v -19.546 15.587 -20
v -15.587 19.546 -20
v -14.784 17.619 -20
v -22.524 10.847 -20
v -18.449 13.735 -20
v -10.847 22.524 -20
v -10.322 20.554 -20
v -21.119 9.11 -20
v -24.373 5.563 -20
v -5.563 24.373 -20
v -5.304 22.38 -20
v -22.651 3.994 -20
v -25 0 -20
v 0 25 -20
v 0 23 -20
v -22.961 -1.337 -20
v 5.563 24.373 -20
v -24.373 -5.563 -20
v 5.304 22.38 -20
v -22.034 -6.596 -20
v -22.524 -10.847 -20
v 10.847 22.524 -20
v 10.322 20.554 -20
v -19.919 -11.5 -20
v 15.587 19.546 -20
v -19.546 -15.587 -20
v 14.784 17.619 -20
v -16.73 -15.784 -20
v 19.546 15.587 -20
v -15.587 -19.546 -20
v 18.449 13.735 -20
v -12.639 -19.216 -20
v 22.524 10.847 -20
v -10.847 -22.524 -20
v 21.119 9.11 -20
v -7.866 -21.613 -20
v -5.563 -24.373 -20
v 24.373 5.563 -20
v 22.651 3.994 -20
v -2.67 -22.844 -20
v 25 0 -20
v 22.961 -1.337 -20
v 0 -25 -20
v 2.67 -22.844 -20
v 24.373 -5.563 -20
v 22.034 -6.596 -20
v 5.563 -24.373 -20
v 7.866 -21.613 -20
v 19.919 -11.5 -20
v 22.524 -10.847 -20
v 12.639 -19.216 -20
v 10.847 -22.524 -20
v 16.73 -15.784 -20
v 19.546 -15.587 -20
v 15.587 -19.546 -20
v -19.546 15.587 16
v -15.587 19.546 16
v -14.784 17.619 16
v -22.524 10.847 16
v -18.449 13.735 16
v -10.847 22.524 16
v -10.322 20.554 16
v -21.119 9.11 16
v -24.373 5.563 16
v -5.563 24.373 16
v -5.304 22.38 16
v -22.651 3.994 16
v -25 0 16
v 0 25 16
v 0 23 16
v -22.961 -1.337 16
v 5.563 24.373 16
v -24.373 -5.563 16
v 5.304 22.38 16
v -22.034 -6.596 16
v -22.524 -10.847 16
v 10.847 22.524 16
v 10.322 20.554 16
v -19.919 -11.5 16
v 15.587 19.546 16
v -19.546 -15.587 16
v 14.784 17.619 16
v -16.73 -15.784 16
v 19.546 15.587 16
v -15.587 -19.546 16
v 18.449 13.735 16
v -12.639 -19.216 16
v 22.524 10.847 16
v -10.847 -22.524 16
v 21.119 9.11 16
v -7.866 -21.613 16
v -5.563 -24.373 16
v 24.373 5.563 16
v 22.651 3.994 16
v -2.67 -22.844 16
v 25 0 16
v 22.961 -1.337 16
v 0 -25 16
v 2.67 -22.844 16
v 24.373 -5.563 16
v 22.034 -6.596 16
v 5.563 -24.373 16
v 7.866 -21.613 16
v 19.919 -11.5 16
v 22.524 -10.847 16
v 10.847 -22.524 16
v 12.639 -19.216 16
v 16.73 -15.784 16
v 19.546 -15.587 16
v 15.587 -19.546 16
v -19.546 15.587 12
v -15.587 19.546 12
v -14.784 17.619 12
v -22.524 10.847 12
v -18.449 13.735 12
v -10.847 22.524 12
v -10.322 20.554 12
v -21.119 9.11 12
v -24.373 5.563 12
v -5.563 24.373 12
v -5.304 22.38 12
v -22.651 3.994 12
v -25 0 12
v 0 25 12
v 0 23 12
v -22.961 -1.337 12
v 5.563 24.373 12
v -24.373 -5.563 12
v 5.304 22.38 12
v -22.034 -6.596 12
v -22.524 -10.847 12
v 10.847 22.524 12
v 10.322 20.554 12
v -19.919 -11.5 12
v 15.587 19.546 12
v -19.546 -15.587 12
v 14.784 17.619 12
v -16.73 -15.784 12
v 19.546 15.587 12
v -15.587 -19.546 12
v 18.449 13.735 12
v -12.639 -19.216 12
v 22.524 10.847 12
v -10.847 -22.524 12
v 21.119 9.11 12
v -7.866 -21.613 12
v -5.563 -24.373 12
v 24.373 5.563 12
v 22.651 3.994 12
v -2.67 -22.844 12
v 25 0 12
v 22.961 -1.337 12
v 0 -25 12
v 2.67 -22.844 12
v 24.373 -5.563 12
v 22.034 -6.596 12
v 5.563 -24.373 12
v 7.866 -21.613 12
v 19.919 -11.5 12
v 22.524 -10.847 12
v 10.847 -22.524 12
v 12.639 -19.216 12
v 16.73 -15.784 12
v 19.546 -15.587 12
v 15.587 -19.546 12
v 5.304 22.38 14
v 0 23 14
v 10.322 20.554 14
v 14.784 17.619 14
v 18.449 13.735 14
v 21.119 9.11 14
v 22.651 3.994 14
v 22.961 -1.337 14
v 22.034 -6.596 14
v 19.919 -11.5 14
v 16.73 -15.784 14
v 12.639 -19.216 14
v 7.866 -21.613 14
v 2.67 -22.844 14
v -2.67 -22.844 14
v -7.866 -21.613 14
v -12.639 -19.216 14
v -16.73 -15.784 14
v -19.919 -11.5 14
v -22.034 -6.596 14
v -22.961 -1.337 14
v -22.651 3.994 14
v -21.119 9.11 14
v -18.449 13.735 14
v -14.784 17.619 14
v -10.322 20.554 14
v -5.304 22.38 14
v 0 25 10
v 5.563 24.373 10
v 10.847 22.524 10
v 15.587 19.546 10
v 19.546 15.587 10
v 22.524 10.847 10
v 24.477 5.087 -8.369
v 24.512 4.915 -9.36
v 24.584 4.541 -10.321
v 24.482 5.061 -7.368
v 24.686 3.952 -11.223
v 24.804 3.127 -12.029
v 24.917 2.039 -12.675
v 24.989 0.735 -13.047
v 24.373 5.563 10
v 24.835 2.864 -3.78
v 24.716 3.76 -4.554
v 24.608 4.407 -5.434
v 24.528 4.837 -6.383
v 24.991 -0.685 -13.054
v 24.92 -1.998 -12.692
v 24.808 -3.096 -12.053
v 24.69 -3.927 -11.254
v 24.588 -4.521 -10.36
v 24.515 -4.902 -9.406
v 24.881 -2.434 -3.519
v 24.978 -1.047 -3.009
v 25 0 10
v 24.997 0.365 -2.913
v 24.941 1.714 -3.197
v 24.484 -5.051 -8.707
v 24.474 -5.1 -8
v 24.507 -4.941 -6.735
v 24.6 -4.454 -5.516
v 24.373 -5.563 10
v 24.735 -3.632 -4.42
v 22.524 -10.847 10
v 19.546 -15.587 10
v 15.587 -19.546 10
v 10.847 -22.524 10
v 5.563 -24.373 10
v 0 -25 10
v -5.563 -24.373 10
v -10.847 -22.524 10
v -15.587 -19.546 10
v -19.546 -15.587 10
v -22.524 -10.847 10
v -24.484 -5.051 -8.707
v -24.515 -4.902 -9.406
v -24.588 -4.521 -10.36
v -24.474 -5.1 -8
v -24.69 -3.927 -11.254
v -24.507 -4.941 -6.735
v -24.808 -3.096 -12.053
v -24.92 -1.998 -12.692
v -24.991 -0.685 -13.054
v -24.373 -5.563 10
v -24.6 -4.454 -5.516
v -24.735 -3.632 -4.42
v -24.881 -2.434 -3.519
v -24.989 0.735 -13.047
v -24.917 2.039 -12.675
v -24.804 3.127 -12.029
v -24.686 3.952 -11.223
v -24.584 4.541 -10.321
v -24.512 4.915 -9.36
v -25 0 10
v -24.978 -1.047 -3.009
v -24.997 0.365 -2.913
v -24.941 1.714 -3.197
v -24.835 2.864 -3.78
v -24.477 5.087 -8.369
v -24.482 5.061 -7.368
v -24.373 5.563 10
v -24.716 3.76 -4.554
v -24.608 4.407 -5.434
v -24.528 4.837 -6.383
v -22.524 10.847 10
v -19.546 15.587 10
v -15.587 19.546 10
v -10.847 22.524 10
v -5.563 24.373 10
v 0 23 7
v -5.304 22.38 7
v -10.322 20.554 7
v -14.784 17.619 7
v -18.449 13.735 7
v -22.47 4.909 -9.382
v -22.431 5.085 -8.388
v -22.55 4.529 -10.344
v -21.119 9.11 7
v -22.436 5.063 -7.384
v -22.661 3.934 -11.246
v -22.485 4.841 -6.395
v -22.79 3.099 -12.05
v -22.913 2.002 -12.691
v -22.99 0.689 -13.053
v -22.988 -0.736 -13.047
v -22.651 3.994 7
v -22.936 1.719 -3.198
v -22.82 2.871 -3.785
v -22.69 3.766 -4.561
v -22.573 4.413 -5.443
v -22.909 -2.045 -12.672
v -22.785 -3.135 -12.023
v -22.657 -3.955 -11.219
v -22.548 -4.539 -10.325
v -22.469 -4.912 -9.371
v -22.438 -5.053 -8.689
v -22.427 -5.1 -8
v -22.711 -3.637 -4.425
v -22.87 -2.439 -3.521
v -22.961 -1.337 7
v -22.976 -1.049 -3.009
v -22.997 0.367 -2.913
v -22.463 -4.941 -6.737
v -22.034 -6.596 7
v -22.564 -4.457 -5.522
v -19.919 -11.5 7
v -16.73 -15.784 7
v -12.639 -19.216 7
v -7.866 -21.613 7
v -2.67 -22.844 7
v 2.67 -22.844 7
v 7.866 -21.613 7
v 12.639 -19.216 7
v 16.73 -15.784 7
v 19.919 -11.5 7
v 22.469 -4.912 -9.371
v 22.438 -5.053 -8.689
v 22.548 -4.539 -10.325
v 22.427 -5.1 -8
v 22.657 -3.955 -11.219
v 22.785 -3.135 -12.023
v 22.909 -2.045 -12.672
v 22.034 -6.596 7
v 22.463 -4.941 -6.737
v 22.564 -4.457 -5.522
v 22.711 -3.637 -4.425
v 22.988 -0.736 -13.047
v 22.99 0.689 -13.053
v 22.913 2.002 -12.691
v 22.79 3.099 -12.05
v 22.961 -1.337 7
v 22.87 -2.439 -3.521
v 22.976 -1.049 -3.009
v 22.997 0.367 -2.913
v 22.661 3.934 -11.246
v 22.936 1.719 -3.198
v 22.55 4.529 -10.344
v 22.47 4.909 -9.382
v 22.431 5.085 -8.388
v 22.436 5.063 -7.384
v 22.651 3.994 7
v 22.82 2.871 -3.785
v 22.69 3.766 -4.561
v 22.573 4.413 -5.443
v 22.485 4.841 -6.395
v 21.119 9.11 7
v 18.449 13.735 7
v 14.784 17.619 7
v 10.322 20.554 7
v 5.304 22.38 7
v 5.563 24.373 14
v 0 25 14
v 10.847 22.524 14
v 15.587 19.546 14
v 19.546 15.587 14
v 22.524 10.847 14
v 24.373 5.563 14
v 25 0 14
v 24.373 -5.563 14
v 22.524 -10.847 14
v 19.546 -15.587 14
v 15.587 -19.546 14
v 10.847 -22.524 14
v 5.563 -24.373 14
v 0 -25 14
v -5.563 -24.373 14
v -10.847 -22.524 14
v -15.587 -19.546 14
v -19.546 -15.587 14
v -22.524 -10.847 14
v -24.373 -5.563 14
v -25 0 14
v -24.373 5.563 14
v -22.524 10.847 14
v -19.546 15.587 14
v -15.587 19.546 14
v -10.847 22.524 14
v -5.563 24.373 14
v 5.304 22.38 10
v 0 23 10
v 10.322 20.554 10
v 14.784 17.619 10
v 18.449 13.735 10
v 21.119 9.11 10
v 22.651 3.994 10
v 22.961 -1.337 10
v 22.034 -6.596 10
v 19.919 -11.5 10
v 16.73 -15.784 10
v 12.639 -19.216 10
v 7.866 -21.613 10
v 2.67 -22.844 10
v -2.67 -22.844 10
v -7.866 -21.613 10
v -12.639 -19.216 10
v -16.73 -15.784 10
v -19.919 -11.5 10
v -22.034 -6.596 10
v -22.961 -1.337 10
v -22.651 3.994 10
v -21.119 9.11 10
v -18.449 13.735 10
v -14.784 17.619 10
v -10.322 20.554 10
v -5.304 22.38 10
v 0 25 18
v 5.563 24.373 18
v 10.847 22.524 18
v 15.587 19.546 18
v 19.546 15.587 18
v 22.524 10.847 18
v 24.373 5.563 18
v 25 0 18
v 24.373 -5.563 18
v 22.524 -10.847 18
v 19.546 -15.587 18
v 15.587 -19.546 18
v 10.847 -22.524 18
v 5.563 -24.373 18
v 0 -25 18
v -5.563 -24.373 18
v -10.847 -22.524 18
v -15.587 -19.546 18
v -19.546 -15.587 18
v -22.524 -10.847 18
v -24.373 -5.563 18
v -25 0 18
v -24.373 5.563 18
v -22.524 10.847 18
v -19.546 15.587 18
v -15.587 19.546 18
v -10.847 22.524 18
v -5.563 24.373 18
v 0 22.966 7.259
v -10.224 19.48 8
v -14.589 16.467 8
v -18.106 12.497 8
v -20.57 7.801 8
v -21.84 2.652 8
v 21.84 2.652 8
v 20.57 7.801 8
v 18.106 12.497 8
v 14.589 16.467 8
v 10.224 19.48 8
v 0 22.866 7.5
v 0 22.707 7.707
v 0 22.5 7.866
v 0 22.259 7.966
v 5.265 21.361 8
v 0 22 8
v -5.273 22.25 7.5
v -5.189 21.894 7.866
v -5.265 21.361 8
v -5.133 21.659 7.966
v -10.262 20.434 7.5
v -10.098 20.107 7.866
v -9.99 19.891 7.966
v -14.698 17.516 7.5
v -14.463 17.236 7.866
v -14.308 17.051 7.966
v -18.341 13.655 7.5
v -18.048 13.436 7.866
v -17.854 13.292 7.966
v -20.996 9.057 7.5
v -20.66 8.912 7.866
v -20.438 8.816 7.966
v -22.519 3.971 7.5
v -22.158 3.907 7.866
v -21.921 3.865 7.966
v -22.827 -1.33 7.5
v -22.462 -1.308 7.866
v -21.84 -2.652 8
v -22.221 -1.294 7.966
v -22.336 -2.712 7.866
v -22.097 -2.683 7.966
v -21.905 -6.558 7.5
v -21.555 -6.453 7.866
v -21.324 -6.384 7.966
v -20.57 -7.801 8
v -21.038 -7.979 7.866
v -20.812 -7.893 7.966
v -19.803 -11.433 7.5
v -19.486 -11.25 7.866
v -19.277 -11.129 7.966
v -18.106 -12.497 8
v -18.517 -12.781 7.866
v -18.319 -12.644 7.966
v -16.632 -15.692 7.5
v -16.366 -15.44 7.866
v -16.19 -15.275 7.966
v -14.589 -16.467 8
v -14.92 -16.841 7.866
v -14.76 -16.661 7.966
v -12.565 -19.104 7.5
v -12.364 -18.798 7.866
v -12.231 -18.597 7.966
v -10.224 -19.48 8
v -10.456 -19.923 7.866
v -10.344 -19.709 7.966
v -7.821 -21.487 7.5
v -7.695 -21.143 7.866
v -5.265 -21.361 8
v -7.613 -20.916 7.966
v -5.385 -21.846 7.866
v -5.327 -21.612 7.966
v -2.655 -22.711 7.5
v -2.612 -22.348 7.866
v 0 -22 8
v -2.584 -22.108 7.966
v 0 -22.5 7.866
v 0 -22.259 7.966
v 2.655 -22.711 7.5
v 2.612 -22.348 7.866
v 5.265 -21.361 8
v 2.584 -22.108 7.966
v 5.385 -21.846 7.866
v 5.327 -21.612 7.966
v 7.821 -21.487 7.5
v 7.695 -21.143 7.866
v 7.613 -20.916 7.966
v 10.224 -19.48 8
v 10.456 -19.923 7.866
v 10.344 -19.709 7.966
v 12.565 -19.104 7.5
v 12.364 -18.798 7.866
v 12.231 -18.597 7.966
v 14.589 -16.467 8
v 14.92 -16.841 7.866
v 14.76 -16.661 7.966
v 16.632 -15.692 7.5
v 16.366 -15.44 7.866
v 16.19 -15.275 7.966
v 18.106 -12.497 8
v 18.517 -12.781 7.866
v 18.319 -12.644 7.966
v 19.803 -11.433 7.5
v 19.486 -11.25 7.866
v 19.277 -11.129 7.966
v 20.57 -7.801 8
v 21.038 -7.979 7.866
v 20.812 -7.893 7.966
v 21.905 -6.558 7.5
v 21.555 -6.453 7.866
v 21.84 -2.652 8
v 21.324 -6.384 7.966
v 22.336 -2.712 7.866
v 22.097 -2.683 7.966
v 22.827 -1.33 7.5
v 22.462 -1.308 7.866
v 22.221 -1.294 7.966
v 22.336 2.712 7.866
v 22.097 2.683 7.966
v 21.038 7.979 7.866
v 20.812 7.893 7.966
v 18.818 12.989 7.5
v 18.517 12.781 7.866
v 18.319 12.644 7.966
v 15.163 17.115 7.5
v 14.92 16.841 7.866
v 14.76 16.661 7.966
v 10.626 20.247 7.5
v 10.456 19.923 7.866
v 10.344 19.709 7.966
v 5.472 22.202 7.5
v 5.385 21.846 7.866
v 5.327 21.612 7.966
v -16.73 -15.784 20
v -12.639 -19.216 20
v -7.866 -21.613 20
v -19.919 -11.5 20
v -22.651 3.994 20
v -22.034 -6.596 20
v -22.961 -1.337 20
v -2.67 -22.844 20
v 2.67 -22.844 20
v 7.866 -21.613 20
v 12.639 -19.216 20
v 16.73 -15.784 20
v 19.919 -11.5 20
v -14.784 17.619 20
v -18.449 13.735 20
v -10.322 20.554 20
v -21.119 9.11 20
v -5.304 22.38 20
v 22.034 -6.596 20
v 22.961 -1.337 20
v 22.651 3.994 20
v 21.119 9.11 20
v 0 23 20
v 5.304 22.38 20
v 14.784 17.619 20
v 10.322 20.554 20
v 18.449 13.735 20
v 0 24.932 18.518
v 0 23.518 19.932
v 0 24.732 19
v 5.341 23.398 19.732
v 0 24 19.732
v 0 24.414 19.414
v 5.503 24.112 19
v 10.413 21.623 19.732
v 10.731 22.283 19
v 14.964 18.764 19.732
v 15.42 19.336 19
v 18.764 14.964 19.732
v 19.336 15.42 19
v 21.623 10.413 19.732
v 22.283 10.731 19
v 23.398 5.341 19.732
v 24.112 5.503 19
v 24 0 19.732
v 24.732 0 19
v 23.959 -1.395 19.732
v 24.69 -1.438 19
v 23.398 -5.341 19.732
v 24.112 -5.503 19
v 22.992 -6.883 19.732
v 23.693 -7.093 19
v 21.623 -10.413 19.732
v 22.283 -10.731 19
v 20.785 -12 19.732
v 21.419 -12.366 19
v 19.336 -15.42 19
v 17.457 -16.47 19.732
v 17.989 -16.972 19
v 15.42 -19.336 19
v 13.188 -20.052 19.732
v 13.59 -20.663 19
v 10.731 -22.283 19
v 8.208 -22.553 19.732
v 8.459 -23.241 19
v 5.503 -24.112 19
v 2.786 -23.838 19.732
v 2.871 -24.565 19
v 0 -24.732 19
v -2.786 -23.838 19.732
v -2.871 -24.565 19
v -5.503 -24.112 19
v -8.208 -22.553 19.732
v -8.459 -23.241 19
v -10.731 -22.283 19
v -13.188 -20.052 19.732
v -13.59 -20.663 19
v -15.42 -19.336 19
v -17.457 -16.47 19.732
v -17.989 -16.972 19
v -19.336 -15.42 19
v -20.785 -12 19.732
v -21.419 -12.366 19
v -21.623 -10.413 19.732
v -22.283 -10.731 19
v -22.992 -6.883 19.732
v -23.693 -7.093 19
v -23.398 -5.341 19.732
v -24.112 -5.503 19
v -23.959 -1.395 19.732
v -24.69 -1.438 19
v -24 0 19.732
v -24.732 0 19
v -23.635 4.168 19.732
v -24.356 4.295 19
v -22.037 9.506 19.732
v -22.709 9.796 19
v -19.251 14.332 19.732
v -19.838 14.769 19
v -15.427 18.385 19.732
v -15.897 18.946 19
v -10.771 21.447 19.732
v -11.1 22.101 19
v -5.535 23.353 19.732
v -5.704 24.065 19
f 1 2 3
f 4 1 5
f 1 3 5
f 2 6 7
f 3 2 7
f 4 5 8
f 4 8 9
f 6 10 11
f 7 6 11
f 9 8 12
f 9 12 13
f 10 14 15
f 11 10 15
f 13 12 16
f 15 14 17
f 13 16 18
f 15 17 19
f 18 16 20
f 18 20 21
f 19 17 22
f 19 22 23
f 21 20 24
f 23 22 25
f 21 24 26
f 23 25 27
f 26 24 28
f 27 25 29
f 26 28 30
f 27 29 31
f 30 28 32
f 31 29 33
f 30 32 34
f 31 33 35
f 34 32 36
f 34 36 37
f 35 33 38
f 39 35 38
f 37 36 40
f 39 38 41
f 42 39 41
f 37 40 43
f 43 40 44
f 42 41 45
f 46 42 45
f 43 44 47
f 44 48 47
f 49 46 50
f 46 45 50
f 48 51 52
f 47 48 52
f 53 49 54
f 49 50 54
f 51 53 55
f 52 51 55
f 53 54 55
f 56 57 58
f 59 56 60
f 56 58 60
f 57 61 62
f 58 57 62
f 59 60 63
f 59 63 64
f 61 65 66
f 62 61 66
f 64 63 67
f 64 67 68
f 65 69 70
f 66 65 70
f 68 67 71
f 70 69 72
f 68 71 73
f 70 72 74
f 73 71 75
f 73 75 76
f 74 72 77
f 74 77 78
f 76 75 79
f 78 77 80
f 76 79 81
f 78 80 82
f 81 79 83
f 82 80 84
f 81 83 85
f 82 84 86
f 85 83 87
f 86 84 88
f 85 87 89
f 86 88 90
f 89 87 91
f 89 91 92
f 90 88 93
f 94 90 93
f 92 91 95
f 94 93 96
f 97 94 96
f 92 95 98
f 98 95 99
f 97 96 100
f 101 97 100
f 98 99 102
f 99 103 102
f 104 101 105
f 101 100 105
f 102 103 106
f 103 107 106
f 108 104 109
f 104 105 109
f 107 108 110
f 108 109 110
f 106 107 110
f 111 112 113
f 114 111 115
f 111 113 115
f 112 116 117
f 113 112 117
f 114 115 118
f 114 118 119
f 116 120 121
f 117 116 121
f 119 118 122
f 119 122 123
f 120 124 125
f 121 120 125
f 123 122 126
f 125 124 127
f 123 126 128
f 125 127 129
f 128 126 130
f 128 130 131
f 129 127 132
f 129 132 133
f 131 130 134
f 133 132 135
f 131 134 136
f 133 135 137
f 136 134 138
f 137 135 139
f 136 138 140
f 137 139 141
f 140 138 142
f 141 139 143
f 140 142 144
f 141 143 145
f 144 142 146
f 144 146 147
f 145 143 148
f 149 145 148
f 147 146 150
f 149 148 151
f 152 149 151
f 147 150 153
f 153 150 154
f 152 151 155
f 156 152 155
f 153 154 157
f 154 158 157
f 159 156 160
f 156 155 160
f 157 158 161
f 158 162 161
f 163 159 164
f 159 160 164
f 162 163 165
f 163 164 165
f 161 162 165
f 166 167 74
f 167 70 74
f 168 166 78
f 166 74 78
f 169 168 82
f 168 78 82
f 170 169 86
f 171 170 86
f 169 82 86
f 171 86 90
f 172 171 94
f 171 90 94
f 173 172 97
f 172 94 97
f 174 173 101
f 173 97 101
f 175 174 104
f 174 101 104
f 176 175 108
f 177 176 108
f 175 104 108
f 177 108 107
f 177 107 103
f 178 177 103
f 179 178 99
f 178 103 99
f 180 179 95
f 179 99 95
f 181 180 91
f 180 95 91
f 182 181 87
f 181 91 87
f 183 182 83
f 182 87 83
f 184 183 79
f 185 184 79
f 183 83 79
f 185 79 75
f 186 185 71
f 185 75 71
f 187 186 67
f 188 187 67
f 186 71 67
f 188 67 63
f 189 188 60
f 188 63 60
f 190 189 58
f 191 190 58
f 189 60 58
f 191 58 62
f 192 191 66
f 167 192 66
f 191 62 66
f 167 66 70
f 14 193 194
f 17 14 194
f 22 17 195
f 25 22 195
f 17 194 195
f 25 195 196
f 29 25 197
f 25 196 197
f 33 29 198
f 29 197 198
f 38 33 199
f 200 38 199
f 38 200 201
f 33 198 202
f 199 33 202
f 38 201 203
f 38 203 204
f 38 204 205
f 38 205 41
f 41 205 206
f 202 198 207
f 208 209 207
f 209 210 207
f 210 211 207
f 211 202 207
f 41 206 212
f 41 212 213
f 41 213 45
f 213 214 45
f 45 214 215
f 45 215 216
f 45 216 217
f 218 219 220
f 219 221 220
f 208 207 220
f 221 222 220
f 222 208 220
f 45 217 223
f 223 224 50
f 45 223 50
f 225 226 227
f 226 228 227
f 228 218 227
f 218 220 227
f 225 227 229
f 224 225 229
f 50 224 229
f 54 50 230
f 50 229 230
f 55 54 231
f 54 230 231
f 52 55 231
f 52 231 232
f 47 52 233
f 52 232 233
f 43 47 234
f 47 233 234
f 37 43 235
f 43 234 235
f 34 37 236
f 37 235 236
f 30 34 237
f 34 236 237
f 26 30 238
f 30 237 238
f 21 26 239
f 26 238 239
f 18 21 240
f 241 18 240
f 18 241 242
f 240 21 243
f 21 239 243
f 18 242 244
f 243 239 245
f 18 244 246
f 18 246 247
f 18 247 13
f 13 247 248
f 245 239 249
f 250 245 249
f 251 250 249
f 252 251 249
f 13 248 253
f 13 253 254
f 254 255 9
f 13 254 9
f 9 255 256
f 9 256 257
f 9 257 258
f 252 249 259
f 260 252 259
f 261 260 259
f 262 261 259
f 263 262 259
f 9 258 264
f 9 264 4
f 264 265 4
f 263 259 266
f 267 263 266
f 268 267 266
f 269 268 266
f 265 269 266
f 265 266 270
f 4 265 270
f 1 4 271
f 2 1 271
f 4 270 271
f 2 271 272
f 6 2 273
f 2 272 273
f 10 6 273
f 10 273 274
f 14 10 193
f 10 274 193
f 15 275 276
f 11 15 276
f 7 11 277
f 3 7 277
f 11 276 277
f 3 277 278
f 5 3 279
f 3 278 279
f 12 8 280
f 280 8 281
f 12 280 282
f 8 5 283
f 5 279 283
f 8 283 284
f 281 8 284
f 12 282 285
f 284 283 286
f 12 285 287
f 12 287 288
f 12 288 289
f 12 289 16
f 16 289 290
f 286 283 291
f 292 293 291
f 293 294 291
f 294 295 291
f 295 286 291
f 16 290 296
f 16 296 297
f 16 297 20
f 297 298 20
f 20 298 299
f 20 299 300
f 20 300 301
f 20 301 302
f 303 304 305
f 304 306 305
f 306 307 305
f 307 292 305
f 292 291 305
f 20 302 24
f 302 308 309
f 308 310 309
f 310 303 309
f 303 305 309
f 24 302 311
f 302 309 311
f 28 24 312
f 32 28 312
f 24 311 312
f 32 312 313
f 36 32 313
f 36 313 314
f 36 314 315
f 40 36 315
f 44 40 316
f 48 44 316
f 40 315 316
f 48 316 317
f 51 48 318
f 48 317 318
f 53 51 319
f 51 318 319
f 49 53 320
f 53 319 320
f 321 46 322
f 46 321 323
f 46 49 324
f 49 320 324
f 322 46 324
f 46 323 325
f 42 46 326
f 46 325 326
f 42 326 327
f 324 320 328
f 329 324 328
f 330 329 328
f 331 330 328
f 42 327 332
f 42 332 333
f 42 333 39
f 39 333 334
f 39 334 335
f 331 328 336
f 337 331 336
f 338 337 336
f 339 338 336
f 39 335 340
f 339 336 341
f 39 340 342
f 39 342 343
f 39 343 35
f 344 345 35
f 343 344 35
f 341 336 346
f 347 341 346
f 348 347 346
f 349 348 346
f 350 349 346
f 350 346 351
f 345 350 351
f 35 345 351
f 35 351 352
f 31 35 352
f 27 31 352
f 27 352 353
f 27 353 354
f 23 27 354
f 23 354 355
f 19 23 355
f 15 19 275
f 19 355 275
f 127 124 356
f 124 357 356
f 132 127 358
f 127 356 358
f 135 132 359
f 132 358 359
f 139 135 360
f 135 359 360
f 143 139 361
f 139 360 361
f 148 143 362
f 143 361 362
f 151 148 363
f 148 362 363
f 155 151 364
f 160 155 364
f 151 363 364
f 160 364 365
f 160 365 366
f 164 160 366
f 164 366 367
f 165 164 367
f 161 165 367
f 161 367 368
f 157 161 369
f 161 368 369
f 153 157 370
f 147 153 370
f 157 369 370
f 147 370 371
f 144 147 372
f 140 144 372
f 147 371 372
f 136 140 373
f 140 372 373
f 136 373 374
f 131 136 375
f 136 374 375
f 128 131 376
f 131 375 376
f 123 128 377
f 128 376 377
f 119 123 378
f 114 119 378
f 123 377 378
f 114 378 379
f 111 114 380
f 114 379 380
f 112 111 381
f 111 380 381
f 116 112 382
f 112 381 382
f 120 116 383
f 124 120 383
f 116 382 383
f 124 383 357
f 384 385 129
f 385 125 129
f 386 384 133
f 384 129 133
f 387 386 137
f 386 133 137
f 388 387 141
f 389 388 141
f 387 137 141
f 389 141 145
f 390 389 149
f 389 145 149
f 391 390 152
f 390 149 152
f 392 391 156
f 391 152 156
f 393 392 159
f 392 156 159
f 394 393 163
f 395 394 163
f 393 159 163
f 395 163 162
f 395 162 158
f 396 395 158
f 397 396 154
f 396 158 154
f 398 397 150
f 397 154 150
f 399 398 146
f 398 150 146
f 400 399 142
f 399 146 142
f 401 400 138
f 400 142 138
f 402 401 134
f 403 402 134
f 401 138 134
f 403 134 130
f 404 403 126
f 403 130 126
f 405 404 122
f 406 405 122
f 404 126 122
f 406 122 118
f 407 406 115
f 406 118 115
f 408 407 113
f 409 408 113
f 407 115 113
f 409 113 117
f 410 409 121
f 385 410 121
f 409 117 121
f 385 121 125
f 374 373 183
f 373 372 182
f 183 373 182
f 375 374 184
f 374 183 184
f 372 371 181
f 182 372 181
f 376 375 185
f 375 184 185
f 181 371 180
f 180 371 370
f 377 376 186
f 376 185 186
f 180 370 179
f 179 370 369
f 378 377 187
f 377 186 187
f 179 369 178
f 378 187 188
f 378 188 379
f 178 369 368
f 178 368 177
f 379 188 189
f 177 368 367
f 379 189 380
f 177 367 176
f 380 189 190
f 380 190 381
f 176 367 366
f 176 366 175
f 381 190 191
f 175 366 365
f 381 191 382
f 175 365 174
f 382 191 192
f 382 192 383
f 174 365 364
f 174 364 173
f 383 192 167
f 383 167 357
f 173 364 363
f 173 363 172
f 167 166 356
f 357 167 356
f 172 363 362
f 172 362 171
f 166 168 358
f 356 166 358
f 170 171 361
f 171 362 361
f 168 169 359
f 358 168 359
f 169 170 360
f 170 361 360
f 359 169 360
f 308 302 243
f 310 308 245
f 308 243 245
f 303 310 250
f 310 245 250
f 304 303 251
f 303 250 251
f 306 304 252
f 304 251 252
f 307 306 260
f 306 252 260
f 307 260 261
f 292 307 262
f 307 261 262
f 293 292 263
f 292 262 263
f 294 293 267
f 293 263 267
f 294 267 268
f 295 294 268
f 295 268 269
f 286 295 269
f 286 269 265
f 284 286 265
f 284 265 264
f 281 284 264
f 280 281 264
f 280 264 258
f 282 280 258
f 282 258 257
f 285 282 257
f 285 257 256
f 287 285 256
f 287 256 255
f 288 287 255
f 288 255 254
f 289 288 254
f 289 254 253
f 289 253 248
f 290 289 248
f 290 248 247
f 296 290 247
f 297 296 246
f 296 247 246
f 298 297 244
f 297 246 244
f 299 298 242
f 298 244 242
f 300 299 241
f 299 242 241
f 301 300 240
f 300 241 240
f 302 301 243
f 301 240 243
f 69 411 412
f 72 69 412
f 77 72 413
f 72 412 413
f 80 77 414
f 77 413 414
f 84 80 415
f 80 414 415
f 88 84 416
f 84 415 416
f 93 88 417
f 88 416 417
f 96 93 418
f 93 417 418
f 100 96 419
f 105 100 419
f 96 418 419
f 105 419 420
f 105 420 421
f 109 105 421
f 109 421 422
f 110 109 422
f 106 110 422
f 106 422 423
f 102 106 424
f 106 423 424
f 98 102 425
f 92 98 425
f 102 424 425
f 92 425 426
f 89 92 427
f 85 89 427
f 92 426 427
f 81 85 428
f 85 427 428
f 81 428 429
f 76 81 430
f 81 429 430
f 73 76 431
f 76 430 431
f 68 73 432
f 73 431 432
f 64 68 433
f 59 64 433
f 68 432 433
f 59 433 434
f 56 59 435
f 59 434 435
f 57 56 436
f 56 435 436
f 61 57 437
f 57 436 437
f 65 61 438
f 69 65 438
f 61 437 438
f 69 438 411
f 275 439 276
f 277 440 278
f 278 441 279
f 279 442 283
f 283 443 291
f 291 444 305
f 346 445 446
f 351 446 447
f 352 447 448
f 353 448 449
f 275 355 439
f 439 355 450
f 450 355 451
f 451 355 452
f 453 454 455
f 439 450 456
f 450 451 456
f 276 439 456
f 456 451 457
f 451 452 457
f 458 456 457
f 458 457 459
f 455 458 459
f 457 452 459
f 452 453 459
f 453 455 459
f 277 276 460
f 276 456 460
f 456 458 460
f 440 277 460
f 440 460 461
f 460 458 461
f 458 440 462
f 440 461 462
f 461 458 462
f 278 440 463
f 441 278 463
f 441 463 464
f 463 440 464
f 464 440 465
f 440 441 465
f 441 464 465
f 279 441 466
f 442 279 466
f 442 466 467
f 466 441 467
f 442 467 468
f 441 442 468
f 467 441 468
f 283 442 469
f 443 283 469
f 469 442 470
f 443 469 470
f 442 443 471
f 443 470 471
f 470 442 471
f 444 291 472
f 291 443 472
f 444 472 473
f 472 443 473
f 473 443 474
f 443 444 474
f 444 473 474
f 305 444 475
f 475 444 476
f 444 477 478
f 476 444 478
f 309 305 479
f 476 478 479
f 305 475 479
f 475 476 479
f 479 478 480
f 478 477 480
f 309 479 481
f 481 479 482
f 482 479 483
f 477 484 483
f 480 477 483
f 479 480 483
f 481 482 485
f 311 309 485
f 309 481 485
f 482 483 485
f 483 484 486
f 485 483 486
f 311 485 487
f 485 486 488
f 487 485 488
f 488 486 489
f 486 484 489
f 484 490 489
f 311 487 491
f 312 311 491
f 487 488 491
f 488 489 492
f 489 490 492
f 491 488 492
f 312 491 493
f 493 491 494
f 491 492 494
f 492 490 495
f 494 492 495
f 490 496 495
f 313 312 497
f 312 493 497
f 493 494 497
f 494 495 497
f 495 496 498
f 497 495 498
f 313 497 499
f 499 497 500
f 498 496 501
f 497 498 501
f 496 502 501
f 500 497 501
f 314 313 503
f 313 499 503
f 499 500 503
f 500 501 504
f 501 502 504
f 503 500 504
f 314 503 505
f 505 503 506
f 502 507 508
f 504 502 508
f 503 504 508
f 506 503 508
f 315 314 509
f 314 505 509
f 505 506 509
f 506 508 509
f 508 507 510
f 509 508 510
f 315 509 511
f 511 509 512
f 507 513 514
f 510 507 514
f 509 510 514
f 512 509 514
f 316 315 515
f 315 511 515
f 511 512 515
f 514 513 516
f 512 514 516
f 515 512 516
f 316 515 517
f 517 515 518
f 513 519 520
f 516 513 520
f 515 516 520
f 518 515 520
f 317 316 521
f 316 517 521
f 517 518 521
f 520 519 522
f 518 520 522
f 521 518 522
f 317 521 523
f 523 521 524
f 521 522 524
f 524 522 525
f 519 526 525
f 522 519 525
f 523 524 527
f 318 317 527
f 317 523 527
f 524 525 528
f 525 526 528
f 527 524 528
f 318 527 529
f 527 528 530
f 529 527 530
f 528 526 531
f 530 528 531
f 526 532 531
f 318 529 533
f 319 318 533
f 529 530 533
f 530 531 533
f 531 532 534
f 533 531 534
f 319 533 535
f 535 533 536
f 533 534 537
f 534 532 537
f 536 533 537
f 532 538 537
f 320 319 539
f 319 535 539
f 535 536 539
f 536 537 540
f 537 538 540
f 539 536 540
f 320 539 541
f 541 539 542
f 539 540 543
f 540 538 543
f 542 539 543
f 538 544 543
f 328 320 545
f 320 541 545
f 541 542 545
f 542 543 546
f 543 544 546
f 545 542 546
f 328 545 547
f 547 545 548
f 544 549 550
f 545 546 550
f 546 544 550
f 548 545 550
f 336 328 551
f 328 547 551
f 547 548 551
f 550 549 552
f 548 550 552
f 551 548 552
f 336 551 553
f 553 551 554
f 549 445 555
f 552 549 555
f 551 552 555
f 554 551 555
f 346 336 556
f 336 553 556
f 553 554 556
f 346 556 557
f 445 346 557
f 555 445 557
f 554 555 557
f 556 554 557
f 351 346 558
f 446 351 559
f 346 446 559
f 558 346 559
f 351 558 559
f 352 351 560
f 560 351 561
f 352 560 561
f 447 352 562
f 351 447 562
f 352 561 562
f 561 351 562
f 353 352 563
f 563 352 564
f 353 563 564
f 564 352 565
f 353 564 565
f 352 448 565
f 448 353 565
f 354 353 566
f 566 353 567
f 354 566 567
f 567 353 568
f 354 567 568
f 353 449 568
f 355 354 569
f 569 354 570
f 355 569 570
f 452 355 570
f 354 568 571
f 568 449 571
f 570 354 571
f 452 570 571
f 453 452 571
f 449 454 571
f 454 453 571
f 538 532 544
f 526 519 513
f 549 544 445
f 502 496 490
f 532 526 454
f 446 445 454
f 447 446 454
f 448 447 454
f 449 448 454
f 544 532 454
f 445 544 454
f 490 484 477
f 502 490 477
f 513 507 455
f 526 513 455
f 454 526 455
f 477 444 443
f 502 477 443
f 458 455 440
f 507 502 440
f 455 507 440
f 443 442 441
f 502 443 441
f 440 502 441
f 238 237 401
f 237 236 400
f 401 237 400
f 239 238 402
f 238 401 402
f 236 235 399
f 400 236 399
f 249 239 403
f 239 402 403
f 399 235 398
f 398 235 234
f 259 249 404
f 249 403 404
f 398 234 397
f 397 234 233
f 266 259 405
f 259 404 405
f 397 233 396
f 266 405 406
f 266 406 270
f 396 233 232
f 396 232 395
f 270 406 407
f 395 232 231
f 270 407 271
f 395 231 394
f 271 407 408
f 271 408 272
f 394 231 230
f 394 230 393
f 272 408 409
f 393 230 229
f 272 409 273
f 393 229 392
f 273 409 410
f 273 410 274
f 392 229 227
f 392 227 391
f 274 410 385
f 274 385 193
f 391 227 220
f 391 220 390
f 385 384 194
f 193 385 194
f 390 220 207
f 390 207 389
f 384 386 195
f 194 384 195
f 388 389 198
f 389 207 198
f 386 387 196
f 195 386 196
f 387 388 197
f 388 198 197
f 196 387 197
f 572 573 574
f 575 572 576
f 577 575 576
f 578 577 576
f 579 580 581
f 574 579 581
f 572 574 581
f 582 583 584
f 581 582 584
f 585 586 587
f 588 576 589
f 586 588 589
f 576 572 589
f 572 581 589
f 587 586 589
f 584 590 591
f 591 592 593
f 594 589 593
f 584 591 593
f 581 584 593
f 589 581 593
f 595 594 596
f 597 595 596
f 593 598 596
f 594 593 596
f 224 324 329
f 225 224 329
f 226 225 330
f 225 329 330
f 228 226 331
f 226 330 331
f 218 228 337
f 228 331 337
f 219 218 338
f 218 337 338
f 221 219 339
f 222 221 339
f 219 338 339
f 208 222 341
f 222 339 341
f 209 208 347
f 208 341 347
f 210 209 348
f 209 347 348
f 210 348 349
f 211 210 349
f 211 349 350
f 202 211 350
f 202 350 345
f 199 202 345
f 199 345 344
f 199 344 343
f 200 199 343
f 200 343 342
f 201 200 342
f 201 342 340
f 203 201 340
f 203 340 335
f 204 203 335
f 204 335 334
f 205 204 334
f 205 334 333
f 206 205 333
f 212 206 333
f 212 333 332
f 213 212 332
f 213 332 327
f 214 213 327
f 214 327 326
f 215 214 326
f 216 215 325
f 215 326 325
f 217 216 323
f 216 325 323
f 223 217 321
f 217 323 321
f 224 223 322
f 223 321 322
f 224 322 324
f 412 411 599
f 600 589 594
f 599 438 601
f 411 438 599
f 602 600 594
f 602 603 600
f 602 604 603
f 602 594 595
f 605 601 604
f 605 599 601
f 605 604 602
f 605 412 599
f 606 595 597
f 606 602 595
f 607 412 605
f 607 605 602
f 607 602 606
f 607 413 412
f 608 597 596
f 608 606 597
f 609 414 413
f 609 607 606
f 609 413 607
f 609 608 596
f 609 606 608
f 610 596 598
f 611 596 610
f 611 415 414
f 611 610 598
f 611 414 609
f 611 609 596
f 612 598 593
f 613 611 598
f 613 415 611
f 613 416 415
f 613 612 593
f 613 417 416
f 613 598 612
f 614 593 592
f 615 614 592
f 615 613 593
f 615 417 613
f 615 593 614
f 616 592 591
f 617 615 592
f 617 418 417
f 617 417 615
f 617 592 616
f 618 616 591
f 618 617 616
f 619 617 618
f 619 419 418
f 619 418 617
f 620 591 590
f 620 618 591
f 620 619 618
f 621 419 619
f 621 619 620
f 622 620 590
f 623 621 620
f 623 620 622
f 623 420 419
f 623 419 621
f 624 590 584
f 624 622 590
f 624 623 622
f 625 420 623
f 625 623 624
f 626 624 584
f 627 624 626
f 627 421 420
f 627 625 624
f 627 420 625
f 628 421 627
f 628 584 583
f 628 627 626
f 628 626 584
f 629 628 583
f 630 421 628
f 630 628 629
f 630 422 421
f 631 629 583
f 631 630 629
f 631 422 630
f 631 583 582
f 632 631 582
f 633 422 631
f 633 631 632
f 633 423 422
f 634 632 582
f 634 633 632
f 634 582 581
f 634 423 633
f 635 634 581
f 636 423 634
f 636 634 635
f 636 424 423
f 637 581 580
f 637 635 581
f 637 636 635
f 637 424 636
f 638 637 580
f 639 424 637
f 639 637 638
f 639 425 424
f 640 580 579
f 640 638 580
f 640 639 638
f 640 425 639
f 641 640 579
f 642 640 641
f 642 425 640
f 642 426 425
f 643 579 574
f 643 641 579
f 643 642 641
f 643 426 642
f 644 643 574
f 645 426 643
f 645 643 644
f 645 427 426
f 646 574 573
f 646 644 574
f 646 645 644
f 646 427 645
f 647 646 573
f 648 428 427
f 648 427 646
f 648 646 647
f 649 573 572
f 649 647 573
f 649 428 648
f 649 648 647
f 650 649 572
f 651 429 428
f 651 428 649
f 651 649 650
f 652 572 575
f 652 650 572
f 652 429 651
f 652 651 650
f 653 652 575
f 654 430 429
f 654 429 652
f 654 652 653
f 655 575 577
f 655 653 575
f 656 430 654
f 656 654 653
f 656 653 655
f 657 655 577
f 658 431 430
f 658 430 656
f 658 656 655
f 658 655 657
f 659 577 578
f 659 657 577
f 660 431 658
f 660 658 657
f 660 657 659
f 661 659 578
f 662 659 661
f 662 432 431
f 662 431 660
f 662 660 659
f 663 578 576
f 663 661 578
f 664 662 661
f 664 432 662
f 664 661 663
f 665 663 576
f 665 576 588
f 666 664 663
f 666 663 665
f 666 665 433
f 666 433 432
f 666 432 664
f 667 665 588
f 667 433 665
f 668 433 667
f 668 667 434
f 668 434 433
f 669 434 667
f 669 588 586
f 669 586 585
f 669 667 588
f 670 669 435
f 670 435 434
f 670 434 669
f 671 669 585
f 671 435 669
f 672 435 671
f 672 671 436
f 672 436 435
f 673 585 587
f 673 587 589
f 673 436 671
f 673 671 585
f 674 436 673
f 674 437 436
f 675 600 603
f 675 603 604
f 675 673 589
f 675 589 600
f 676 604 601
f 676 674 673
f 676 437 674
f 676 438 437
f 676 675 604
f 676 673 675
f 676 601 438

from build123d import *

# Parameters (mm, degrees)
F2_R = 2
F7_D = 10.2


with BuildPart() as f1:
    # F0 (on Right) → F1 (revolve)
    with BuildSketch(Plane.YZ):
        Polygon((25, 20), (0, 20), (0, 16), (0, -20), (25, -20), (25, 10), (23, 10), (23, 12), (25, 12), (25, 14), (23, 14), (23, 16), (25, 16), align=None)
    revolve(axis=Axis((0, 0, -4), (0, 0, -1)))

    # F2
    f2_edges = [f1.edges().sort_by_distance(p)[0] for p in [
        (0, -25, 20),
    ]]
    fillet(f2_edges, radius=F2_R)

    # F3 (on Right) → F4 (revolve, cut)
    with BuildSketch(Plane.YZ):
        with BuildLine():
            Line((0, 8), (0, -20))
            Line((0, -20), (23, -20))
            Line((23, -20), (23, 7))
            ThreePointArc((23, 7), (22.707107, 7.707107), (22, 8))
            Line((22, 8), (0, 8))
        make_face()
    revolve(axis=Axis((0, 0, -6), (0, 0, 1)), mode=Mode.SUBTRACT)

    # F7 (through all)
    with Locations(Plane.YZ.offset(25)):
        with Locations((0, -8)):
            Hole(F7_D / 2)


solid = f1.part
